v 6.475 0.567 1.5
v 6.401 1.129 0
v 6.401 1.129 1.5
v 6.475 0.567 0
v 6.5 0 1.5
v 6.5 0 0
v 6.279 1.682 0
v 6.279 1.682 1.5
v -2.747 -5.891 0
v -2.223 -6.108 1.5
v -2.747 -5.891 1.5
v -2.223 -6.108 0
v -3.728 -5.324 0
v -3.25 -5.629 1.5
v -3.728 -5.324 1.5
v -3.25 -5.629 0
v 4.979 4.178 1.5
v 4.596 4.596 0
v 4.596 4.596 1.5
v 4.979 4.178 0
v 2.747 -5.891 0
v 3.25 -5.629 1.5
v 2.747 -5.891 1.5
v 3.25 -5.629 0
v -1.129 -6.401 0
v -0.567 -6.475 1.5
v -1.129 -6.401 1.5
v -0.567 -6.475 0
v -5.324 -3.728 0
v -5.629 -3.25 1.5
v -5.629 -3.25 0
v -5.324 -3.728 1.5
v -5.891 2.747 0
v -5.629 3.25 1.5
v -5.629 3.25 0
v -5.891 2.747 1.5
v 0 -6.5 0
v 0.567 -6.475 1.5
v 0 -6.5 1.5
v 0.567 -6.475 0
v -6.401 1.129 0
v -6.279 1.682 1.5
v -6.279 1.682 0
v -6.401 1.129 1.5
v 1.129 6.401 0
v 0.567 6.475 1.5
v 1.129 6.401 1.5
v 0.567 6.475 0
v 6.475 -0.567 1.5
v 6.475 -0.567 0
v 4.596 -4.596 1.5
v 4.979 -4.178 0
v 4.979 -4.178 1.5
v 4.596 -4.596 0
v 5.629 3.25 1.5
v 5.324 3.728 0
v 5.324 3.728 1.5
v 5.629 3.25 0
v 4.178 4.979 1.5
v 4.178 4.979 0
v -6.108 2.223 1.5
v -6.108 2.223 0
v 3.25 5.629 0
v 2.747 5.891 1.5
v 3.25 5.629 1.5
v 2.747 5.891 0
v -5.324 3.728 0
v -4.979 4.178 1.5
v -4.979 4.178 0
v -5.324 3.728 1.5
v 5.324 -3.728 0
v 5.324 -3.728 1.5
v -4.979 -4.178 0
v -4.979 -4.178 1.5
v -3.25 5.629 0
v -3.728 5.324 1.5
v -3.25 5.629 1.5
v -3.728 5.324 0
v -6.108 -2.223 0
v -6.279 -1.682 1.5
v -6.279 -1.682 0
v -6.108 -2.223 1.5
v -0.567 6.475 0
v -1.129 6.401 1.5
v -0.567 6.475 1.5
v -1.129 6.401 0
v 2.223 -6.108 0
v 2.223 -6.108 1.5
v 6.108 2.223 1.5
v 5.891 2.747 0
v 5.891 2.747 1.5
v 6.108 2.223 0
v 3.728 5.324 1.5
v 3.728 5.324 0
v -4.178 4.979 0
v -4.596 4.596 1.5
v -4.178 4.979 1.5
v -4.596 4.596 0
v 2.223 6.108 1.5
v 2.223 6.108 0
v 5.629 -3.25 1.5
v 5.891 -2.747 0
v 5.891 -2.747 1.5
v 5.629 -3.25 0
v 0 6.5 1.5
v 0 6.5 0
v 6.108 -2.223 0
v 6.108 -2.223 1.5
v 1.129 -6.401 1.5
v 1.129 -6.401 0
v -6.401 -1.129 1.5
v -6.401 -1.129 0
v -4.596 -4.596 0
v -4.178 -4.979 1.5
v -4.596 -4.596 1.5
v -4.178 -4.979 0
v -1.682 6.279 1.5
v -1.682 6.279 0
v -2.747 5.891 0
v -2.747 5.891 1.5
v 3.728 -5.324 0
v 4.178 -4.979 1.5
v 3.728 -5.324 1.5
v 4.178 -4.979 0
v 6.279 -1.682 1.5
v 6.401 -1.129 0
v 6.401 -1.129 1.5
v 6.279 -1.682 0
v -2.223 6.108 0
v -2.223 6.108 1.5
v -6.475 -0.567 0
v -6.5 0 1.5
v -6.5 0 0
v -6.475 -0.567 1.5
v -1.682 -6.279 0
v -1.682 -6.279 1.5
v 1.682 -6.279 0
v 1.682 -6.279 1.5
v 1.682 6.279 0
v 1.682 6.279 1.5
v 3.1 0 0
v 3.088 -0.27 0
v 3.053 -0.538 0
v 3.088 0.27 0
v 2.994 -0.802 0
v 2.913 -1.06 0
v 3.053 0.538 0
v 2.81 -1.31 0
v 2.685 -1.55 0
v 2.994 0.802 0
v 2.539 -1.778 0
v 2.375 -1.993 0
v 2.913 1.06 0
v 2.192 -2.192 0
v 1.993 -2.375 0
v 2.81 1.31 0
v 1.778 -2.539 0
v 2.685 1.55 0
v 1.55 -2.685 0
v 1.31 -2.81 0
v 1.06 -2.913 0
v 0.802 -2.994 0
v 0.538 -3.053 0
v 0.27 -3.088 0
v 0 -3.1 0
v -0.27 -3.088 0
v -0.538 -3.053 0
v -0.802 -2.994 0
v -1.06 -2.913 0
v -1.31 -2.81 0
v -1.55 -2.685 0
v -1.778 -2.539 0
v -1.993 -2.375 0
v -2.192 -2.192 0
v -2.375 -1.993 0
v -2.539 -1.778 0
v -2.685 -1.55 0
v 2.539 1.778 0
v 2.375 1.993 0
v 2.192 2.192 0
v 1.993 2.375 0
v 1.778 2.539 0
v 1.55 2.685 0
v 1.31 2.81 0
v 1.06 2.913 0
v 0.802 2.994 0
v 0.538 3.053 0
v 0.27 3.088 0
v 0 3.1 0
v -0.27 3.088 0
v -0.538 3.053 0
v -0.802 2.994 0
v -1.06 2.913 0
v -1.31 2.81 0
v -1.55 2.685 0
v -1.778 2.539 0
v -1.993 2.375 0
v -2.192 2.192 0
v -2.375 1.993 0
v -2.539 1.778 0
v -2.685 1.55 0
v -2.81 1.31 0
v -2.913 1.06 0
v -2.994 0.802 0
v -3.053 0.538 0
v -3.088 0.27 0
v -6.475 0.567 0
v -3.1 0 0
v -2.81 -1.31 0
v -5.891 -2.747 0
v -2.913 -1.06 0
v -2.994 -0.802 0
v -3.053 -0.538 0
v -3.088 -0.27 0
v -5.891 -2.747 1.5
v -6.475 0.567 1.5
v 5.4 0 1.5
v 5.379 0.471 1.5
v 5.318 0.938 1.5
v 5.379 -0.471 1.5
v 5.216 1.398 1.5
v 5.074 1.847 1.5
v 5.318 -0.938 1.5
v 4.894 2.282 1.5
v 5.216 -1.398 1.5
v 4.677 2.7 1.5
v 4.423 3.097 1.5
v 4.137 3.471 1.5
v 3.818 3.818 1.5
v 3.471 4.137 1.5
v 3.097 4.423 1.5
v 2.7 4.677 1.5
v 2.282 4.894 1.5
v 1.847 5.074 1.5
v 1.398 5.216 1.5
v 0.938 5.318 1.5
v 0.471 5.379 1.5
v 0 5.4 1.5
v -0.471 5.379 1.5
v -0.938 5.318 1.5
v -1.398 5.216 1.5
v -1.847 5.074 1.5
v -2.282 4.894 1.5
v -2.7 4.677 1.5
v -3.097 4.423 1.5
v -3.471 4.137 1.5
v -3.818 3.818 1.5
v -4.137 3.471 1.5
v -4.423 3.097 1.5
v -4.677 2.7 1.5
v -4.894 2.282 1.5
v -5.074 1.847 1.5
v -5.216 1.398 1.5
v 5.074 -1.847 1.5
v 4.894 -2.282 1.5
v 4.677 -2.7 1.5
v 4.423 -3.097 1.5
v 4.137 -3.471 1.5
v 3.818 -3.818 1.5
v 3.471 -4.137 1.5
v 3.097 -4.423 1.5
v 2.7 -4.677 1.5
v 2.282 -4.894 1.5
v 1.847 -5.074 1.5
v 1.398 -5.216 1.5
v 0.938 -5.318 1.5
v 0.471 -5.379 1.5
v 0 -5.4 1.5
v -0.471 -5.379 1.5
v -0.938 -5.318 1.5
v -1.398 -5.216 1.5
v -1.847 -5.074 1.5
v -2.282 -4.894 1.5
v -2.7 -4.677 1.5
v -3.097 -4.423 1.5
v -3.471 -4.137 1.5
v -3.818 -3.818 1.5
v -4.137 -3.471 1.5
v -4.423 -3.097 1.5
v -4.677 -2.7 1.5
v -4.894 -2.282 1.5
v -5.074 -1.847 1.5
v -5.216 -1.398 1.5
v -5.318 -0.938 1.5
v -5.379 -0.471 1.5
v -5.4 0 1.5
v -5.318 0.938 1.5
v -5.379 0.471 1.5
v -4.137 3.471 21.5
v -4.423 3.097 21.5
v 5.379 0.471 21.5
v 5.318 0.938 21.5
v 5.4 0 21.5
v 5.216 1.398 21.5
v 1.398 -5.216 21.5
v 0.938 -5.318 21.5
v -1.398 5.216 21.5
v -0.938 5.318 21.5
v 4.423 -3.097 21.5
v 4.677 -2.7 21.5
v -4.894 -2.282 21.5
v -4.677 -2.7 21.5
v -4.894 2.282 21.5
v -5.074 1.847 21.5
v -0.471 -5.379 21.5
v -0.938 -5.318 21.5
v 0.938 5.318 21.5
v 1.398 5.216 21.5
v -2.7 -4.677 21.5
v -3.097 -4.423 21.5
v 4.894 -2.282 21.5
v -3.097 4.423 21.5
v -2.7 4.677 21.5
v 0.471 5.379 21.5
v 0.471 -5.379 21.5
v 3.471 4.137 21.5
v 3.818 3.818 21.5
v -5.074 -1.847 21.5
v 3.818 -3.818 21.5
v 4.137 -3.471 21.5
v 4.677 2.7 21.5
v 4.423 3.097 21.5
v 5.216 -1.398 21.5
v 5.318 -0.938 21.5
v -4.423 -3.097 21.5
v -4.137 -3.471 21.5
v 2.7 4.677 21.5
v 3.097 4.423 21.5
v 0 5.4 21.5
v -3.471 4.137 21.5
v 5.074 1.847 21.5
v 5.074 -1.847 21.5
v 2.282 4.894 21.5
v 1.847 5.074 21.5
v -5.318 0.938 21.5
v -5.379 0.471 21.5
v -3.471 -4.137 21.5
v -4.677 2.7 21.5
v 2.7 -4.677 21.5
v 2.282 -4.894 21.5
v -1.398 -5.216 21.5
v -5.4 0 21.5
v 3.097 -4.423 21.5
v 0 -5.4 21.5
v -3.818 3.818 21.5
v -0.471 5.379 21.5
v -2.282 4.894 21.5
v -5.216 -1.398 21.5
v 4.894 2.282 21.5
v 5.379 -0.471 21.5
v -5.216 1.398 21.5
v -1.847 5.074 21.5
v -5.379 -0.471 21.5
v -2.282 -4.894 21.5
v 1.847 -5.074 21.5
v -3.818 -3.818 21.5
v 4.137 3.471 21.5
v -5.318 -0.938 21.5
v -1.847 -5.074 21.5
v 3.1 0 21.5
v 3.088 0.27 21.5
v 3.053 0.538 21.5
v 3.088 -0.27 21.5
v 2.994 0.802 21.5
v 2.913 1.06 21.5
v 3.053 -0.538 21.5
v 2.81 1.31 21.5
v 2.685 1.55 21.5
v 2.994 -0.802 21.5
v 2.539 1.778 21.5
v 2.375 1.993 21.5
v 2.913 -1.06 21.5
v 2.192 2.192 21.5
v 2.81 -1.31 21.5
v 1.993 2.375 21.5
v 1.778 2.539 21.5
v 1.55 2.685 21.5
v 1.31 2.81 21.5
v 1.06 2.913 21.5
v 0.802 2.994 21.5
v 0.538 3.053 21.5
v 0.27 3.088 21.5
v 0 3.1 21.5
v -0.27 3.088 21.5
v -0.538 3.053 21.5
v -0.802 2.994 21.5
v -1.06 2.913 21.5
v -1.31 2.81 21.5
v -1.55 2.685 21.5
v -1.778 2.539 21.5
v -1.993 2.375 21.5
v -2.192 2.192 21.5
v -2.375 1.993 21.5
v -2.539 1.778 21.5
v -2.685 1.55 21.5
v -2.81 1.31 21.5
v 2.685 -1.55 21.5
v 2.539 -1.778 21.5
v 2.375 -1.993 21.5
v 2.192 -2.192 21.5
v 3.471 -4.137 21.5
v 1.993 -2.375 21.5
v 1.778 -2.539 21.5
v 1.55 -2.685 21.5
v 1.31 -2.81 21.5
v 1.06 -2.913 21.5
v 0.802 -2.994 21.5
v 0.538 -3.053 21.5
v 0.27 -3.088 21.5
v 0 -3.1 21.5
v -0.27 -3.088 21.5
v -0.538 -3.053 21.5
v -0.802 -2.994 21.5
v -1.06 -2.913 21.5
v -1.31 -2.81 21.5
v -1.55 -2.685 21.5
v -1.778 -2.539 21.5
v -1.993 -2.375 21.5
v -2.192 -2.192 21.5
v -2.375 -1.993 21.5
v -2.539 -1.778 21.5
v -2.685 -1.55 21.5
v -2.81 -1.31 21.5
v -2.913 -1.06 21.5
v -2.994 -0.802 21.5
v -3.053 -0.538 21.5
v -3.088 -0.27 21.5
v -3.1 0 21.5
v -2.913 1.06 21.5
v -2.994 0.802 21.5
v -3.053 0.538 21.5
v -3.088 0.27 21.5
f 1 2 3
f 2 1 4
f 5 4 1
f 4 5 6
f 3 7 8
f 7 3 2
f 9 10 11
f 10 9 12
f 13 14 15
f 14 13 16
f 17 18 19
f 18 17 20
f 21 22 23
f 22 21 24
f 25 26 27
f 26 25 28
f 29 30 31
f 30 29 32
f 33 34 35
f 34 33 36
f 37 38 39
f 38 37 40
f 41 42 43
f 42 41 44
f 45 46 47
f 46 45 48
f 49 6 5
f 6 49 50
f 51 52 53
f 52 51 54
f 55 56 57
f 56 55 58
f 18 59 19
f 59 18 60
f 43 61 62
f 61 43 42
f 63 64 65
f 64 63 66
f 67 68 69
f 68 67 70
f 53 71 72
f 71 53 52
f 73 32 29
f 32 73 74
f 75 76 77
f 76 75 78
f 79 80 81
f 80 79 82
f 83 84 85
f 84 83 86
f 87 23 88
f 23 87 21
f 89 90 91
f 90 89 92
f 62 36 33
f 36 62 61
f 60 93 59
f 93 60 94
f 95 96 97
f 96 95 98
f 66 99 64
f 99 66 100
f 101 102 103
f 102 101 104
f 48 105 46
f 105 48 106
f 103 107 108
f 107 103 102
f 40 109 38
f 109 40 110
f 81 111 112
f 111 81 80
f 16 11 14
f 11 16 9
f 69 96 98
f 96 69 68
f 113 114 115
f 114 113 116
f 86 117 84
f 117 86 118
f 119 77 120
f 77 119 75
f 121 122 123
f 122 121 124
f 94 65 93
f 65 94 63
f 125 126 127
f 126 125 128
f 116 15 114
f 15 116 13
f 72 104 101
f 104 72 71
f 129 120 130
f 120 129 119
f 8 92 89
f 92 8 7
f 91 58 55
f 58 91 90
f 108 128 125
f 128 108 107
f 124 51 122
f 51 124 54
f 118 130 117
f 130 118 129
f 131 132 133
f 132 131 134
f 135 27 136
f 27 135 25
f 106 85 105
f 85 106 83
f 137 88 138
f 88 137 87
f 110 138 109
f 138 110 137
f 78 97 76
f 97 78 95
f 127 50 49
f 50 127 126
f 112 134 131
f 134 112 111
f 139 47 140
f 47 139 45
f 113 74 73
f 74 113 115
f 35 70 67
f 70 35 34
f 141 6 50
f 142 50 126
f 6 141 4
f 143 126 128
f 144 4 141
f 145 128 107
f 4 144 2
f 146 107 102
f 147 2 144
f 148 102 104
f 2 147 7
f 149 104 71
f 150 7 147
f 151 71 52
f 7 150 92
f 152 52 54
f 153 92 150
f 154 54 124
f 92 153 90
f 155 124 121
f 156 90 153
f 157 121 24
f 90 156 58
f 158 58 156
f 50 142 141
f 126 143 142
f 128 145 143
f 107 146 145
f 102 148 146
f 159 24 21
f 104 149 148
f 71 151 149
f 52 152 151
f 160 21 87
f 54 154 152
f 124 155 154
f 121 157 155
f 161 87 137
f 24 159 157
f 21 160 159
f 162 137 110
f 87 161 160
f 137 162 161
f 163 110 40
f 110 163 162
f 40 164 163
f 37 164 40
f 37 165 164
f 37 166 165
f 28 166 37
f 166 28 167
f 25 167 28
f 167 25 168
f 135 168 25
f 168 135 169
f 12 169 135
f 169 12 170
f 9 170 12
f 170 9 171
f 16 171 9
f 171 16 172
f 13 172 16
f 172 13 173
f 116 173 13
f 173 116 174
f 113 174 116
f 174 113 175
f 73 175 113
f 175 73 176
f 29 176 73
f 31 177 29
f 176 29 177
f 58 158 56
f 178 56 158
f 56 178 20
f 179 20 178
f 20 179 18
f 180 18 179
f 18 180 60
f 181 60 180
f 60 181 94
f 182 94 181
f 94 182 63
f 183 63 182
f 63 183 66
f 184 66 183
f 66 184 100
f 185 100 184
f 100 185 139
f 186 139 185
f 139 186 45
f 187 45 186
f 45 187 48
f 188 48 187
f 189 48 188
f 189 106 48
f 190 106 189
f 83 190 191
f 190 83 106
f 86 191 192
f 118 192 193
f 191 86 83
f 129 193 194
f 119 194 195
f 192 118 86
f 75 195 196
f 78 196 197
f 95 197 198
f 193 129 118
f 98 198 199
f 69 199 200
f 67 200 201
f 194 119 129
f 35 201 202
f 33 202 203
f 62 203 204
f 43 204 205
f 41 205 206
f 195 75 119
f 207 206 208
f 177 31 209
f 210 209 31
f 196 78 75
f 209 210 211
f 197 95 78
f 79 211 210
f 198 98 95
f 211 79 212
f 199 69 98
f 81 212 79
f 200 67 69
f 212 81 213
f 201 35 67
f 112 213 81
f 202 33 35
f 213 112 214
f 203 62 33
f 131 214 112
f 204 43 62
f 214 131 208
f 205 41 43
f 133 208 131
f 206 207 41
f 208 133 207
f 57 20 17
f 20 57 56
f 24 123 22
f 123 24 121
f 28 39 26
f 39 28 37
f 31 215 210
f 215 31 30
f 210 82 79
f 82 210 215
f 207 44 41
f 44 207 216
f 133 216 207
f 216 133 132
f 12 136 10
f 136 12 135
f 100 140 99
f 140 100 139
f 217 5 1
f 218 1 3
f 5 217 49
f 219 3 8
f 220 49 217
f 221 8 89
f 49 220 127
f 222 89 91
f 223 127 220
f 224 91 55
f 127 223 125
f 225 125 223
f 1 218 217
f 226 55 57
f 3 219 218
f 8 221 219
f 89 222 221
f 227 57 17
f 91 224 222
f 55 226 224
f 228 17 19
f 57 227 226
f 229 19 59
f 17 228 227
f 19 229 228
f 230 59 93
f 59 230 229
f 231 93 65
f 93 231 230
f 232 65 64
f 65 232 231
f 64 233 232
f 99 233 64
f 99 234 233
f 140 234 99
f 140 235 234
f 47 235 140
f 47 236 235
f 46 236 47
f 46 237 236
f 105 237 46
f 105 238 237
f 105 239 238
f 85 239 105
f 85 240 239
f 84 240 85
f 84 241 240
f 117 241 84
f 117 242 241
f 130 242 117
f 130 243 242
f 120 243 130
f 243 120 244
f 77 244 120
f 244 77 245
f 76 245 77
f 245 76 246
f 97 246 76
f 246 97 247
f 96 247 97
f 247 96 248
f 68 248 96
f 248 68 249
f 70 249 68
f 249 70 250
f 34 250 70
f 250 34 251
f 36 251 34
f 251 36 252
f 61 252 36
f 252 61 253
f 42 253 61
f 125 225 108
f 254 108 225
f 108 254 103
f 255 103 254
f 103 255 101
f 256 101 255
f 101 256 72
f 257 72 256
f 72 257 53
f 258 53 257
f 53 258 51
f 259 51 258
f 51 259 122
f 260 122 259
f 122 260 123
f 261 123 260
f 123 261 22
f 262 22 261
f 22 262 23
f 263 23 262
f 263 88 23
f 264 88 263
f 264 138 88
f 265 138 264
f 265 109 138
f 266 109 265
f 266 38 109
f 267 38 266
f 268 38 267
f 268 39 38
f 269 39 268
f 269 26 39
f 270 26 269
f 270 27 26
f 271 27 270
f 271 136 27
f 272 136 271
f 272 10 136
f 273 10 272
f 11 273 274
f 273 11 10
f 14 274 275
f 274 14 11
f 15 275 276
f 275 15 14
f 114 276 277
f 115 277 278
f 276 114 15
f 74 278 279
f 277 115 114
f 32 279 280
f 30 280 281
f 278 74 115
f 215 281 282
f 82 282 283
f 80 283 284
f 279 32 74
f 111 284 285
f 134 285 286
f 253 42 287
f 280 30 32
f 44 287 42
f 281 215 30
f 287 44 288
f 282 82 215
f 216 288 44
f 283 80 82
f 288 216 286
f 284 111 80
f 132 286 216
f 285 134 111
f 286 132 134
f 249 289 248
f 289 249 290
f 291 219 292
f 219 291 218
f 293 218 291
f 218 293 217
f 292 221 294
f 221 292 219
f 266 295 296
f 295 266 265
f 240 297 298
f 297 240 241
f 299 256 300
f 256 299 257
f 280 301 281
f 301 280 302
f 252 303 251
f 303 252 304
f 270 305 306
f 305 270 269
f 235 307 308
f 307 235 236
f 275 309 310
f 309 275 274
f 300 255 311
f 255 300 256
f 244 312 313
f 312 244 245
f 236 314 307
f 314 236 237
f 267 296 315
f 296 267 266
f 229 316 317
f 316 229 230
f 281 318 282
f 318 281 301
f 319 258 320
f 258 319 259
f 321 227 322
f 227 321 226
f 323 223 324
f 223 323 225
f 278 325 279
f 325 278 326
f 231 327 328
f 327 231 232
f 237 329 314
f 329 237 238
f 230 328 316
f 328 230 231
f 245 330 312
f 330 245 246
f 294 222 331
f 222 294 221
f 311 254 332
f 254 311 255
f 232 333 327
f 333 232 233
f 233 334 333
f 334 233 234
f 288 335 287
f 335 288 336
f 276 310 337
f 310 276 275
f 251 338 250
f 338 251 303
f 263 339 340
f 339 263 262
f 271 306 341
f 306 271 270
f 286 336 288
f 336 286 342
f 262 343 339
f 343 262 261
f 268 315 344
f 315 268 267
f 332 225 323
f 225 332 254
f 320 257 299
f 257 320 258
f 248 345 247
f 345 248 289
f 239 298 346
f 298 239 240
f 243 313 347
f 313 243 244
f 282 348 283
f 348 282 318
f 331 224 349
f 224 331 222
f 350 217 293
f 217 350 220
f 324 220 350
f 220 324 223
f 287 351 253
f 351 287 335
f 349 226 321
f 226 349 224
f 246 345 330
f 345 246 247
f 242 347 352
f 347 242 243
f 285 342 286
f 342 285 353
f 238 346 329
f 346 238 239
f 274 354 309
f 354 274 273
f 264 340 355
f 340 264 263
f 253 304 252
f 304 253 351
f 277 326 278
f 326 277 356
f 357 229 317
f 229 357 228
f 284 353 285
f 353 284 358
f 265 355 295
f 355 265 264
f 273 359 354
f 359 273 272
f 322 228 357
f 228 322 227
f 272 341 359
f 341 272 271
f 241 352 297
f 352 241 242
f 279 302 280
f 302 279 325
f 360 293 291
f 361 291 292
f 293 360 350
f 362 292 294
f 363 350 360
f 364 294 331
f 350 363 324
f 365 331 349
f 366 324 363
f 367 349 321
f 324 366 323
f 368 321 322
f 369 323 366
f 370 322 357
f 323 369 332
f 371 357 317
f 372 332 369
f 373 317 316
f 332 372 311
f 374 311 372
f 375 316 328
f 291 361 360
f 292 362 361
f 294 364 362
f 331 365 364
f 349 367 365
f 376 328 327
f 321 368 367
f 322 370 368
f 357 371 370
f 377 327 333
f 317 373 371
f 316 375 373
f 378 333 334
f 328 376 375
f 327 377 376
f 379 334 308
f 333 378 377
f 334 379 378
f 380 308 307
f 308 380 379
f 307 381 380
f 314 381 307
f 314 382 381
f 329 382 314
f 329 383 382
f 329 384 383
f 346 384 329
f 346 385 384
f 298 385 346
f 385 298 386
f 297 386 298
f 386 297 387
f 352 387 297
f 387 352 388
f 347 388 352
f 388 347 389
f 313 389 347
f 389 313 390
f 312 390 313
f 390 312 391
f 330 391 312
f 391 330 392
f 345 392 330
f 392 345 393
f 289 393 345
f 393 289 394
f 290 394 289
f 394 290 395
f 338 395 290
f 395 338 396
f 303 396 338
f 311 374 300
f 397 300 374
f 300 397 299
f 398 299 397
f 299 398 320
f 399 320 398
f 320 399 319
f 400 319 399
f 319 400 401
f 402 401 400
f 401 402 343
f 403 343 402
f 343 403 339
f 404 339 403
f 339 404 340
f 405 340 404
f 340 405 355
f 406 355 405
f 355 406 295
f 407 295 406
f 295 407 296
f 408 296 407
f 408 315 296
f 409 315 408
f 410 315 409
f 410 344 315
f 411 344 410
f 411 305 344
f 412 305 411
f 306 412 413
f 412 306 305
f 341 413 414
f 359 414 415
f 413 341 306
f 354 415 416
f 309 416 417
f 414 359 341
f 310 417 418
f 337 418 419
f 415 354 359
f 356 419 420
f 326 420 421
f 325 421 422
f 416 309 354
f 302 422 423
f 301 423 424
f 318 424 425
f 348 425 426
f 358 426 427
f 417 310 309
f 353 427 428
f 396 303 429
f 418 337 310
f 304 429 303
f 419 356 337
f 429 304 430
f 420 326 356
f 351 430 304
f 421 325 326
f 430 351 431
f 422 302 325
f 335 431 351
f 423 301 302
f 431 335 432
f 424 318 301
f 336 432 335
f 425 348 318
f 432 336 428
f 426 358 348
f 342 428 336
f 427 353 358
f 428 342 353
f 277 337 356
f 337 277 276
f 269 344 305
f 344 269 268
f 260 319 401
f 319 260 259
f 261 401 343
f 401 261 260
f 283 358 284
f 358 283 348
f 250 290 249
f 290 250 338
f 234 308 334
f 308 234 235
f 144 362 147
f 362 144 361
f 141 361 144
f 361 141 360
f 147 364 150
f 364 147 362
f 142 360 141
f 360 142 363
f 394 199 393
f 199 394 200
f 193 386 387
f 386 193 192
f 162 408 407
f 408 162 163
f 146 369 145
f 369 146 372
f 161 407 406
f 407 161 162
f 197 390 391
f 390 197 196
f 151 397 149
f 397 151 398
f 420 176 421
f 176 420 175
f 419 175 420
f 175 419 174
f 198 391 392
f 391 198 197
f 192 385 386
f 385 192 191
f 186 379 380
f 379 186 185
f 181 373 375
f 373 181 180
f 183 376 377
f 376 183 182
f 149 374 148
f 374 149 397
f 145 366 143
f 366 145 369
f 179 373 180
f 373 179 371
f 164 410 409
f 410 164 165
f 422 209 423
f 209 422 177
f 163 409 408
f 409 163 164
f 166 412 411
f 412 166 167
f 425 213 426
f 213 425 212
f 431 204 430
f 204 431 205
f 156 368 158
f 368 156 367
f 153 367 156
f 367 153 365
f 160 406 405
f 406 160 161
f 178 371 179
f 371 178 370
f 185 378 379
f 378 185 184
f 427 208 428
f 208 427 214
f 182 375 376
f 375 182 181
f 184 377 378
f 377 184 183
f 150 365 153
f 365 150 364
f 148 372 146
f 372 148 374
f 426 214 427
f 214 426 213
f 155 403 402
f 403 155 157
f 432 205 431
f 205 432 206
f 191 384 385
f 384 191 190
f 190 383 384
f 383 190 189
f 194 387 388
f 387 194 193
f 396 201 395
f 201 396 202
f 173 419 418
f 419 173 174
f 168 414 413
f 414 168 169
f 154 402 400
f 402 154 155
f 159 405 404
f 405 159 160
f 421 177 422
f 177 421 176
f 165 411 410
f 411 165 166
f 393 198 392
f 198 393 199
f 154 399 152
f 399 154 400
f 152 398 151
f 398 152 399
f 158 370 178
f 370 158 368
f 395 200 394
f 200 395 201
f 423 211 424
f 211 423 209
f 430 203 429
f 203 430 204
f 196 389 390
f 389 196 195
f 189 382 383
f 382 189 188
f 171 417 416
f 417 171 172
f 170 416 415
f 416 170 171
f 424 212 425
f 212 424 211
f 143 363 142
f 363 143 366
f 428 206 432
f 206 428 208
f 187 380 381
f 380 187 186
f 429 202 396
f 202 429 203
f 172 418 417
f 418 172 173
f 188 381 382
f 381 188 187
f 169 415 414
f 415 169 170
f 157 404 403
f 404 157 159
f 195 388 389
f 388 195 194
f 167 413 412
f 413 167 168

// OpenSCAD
// Adapter sleeve - a collar with a sleeve body that lines a 1.5 mL tube rack hole to
// hold a 0.2 mL PCR tube. Printed upside down: the collar lies on the bed and the
// sleeve body rises from it. A through-bore opens at both ends.
//

collar_d  = 13;
collar_h  = 1.5;
body_od   = 10.8;
body_h    = 21.5;
bore      = 6.2;

$fn = 72;

collar_t = 2;

difference() {
    union() {
        cylinder(h = collar_h, d = collar_d);
        cylinder(h = body_h, d = body_od);
    }
    translate([0, 0, -1]) cylinder(h = body_h + 2, d = bore);
    translate([0, 0, body_h + 0.5]) cylinder(h = collar_t + 0.5, d = bore);
}
